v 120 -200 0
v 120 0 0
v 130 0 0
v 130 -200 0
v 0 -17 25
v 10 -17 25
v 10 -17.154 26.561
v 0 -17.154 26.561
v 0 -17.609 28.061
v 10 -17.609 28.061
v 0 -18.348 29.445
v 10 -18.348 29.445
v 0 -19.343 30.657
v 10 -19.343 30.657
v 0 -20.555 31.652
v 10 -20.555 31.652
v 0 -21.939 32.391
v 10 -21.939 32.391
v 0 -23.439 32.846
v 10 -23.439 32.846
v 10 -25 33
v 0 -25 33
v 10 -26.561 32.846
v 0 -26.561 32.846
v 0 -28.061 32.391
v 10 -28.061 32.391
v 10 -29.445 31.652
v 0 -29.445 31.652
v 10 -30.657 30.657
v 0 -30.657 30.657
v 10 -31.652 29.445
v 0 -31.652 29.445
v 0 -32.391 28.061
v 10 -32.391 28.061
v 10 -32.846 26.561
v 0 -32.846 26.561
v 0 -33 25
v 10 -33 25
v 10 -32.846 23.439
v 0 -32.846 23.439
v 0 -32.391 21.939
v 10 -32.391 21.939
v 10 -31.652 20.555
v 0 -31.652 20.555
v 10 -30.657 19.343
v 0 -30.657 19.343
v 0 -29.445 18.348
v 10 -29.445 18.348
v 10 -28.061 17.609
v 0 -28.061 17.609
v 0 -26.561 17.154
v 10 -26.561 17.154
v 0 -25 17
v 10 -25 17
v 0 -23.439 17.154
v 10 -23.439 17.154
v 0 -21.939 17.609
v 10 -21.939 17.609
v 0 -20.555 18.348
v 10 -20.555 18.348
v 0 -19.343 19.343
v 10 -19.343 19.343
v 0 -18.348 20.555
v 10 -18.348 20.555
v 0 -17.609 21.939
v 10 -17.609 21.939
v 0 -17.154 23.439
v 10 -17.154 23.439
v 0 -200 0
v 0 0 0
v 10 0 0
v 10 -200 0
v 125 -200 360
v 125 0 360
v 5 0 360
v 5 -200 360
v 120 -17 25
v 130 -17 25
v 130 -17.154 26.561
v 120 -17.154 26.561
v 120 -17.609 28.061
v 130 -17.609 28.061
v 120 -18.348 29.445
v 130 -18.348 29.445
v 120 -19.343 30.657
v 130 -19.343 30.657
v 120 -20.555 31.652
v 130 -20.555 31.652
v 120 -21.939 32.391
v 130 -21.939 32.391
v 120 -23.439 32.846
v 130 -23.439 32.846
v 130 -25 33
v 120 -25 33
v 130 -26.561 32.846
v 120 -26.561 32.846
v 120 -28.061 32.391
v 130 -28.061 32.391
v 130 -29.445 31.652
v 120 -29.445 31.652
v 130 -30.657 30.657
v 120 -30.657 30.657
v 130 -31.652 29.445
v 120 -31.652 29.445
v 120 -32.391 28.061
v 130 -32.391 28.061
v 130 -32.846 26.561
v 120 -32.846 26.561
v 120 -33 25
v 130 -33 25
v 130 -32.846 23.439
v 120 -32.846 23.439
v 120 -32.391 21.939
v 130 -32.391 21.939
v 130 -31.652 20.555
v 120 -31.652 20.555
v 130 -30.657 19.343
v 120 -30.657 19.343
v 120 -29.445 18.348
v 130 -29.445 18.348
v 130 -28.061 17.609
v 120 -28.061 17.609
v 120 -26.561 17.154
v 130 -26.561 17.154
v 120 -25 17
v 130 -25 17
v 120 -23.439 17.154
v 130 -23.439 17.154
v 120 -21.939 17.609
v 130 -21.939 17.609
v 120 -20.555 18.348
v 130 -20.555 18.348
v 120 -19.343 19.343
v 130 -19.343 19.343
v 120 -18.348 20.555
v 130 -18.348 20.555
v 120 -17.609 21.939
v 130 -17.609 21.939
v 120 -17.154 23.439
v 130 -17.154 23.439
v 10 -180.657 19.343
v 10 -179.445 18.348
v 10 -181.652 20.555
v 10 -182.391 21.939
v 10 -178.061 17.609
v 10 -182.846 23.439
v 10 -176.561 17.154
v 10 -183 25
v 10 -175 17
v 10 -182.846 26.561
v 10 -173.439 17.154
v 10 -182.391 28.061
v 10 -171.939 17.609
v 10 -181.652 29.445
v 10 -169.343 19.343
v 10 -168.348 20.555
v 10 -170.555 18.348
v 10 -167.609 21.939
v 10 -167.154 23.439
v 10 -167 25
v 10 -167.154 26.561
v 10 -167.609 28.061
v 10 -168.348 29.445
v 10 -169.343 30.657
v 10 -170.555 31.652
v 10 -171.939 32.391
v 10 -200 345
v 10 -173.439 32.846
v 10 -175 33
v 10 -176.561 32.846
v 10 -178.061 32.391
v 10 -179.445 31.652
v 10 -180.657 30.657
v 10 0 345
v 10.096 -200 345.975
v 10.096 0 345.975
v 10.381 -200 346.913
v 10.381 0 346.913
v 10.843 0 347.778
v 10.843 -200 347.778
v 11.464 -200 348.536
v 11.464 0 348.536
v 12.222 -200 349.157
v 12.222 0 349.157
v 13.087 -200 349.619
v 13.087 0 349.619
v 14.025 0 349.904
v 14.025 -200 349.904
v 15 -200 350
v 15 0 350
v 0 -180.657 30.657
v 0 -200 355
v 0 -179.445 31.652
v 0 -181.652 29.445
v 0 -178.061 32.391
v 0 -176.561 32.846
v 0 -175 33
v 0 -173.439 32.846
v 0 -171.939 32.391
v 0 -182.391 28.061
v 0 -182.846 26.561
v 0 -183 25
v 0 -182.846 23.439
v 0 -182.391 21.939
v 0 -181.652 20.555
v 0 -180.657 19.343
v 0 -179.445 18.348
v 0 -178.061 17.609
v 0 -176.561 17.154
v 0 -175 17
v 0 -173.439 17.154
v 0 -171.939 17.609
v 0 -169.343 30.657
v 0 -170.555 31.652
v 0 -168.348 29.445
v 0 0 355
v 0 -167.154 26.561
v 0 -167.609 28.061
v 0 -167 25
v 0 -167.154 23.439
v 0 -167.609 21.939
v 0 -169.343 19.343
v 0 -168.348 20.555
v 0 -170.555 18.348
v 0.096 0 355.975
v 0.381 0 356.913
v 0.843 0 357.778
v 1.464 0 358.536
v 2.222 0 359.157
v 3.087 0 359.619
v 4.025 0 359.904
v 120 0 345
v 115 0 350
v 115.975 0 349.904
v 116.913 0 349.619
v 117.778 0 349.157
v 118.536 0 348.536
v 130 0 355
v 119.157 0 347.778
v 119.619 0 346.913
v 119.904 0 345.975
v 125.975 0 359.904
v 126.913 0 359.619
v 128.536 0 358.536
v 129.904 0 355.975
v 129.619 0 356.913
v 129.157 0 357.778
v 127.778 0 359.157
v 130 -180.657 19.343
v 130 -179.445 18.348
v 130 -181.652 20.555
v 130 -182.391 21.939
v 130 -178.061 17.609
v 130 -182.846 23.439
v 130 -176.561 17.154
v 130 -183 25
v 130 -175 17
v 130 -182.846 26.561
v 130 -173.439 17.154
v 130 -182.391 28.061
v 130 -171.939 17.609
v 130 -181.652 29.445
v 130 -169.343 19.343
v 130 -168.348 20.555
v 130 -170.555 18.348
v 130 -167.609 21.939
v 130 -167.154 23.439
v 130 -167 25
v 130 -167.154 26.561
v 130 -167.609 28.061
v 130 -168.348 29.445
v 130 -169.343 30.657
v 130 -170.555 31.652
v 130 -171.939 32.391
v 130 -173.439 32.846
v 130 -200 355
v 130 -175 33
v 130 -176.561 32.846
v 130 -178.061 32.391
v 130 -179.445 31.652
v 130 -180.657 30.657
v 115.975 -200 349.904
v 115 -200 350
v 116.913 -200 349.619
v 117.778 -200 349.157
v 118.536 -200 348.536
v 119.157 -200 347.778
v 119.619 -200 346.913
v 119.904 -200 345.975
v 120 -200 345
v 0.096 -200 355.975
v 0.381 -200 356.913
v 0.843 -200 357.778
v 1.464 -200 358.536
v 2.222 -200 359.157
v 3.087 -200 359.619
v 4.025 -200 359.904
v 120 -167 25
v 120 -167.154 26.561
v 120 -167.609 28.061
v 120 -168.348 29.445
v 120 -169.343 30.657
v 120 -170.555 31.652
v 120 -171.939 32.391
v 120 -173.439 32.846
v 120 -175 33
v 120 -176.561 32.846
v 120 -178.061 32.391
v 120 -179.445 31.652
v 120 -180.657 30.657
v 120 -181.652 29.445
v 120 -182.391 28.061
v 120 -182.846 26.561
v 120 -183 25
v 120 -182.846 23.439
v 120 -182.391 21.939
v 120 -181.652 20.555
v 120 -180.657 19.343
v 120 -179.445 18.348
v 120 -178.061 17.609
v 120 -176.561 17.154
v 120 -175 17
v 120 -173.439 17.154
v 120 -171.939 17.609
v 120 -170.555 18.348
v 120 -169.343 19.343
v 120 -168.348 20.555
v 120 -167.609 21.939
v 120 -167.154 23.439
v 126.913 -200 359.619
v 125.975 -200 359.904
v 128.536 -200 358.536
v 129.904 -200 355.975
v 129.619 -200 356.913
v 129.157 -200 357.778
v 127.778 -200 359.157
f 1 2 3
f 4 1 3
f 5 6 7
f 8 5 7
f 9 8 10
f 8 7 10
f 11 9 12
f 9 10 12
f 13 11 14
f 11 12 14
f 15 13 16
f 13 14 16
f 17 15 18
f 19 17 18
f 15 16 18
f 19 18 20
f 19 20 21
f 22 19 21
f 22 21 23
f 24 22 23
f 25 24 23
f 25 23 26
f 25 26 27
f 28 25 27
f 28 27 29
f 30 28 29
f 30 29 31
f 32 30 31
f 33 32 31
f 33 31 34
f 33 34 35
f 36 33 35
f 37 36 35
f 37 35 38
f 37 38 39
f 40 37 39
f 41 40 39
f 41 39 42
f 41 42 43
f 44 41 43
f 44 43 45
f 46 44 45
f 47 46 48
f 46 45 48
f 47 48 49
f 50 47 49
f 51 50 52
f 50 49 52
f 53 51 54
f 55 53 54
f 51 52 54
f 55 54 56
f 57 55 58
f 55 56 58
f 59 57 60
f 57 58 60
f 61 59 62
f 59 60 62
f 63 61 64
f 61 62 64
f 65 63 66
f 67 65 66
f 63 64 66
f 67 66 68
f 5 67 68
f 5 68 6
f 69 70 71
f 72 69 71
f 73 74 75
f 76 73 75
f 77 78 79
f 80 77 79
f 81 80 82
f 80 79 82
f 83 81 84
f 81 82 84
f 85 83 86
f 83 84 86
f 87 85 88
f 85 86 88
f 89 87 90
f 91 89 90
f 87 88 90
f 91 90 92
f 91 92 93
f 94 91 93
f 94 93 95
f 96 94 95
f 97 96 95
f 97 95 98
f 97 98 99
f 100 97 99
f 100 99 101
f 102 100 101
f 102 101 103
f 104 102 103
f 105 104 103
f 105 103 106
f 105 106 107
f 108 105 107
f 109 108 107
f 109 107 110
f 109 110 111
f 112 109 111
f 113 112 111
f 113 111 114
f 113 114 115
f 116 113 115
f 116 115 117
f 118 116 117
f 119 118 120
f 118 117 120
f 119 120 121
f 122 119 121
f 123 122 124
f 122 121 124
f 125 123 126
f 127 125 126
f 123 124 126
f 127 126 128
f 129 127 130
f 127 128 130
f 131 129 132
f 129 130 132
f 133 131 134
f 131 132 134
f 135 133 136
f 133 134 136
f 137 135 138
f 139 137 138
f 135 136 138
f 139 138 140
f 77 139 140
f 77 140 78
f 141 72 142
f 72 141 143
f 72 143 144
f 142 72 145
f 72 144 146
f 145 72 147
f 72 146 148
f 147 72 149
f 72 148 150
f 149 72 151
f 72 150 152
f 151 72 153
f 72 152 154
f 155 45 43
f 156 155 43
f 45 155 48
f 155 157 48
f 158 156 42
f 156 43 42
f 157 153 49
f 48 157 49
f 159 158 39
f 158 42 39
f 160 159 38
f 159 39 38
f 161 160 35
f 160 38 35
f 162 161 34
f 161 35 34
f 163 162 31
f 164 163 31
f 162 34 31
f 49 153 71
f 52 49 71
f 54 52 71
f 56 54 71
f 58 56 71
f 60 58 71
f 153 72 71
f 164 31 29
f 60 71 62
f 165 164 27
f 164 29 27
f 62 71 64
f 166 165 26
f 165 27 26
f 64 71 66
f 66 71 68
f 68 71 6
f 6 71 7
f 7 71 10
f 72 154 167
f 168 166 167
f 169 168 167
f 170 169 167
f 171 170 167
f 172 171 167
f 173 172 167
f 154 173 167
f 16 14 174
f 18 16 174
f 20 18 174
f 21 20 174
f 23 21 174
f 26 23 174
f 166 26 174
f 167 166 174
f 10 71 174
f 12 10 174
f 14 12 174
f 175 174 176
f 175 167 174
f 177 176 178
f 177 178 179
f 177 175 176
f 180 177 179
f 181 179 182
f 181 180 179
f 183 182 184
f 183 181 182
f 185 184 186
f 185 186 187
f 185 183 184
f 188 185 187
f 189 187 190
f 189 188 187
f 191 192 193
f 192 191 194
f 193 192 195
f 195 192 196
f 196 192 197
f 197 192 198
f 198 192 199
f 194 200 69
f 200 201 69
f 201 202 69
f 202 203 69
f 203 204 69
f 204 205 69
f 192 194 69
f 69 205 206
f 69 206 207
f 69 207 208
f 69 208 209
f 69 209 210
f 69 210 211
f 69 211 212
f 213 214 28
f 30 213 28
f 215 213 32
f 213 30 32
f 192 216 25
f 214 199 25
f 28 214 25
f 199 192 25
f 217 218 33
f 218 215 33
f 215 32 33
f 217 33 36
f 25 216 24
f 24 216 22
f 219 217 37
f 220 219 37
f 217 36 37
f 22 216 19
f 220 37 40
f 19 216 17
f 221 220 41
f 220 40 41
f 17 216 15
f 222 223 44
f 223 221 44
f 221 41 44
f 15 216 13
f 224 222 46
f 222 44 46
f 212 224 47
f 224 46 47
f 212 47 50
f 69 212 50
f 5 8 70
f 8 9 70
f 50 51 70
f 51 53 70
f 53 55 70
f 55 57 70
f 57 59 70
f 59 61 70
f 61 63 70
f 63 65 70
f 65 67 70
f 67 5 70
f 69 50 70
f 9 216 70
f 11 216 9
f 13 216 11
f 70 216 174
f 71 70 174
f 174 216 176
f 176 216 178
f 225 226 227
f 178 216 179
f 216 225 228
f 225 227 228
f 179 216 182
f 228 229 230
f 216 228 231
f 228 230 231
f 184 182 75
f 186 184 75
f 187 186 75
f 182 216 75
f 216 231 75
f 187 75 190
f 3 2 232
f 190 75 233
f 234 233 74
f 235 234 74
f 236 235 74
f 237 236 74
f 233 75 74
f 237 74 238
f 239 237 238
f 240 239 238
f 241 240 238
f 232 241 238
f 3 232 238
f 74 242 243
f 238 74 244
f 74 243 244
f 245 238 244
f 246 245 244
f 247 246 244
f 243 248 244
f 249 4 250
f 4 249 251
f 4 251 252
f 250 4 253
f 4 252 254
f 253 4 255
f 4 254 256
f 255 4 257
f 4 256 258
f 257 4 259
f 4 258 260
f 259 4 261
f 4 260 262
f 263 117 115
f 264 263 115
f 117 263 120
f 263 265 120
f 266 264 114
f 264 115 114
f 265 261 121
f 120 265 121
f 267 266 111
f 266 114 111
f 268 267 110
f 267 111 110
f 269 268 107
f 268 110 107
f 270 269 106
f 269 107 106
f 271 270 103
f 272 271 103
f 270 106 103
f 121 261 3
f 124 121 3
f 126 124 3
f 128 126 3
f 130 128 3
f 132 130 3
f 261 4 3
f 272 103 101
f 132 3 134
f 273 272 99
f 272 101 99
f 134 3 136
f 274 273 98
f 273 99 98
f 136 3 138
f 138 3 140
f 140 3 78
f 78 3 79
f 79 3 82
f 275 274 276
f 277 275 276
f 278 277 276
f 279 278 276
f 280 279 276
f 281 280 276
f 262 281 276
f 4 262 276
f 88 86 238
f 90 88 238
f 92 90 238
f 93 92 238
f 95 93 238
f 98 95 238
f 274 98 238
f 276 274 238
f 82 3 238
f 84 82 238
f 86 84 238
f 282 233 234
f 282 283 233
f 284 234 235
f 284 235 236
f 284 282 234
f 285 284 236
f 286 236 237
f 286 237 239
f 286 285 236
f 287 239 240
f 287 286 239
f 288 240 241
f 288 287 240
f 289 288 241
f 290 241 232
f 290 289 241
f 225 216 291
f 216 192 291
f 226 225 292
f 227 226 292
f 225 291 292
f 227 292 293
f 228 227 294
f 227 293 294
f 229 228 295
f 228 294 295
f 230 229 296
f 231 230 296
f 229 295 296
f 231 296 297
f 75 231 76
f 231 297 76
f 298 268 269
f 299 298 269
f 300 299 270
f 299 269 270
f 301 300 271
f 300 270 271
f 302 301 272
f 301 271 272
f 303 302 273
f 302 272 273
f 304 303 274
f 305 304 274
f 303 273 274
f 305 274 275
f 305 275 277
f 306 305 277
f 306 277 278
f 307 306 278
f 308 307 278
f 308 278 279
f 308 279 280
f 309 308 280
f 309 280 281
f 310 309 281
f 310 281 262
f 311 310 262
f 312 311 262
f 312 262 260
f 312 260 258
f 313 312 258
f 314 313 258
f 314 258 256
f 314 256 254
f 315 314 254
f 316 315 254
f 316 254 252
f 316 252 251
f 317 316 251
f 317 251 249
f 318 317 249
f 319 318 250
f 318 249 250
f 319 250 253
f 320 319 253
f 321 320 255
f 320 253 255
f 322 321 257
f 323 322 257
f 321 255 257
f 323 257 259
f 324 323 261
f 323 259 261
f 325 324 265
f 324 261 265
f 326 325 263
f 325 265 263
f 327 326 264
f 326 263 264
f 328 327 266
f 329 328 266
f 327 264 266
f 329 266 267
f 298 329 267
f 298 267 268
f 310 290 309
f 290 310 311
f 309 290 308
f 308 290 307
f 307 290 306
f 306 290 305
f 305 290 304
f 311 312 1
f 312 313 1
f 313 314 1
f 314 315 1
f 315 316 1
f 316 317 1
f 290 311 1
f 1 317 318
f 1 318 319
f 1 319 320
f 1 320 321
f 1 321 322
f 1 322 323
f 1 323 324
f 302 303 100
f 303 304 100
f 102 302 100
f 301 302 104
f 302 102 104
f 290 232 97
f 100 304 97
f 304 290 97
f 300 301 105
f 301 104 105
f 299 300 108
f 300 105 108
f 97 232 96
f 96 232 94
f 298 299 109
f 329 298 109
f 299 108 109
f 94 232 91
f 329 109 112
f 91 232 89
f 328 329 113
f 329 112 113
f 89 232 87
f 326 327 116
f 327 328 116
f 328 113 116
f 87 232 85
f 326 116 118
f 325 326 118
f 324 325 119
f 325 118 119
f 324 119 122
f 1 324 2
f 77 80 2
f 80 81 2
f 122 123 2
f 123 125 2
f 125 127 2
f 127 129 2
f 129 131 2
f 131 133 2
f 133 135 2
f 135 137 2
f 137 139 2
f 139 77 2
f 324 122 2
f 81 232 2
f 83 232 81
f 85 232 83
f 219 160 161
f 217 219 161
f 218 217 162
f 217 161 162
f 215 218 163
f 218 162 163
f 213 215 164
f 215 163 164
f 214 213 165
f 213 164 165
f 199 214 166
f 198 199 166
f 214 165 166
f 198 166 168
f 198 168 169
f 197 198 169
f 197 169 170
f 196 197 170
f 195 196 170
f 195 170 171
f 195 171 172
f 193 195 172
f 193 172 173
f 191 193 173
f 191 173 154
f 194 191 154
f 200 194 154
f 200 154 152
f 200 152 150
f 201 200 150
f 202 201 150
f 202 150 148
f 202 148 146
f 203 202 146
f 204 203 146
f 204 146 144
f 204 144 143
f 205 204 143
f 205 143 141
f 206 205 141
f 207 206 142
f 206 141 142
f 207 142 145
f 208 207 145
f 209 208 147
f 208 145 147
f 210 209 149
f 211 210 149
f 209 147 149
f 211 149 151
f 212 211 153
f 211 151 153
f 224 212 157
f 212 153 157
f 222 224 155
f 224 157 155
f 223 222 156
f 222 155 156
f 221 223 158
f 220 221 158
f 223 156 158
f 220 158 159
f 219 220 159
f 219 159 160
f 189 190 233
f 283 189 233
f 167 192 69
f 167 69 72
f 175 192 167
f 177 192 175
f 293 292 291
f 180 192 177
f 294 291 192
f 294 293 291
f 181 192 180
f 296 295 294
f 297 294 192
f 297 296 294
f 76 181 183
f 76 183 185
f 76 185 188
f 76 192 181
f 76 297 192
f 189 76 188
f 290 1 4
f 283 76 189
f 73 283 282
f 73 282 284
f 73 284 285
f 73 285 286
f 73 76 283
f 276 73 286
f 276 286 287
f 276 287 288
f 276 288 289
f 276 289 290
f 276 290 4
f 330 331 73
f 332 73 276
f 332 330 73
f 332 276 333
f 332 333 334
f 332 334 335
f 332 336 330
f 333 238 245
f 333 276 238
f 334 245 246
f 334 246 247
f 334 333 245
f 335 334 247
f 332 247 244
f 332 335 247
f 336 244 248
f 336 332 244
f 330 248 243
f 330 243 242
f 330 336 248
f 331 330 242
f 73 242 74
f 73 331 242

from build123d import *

# Parameters (mm, degrees)
F1_DEPTH = 200
F2_R     = 5
F3_R     = 8
F4_DEPTH = 400


with BuildPart() as f1:
    # F0 (on Front) → F1 (new body)
    with BuildSketch(Plane.XZ):
        Polygon((0, 360), (0, 0), (10, 0), (10, 350), (120, 350), (120, 0), (130, 0), (130, 360), align=None)
    extrude(amount=F1_DEPTH)

    # F2
    f2_edges = [f1.edges().sort_by_distance(p)[0] for p in [
        (130, -100, 360),
        (0, -100, 360),
        (10, -100, 350),
        (120, -100, 350),
    ]]
    fillet(f2_edges, radius=F2_R)

    # F3 (on face) → F4 (cut)
    with BuildSketch(Plane.YZ.offset(130)):
        with Locations((-25, 25)):
            Circle(F3_R)
        with Locations((-175, 25)):
            Circle(F3_R)
    extrude(amount=-F4_DEPTH, mode=Mode.SUBTRACT)


solid = f1.part
